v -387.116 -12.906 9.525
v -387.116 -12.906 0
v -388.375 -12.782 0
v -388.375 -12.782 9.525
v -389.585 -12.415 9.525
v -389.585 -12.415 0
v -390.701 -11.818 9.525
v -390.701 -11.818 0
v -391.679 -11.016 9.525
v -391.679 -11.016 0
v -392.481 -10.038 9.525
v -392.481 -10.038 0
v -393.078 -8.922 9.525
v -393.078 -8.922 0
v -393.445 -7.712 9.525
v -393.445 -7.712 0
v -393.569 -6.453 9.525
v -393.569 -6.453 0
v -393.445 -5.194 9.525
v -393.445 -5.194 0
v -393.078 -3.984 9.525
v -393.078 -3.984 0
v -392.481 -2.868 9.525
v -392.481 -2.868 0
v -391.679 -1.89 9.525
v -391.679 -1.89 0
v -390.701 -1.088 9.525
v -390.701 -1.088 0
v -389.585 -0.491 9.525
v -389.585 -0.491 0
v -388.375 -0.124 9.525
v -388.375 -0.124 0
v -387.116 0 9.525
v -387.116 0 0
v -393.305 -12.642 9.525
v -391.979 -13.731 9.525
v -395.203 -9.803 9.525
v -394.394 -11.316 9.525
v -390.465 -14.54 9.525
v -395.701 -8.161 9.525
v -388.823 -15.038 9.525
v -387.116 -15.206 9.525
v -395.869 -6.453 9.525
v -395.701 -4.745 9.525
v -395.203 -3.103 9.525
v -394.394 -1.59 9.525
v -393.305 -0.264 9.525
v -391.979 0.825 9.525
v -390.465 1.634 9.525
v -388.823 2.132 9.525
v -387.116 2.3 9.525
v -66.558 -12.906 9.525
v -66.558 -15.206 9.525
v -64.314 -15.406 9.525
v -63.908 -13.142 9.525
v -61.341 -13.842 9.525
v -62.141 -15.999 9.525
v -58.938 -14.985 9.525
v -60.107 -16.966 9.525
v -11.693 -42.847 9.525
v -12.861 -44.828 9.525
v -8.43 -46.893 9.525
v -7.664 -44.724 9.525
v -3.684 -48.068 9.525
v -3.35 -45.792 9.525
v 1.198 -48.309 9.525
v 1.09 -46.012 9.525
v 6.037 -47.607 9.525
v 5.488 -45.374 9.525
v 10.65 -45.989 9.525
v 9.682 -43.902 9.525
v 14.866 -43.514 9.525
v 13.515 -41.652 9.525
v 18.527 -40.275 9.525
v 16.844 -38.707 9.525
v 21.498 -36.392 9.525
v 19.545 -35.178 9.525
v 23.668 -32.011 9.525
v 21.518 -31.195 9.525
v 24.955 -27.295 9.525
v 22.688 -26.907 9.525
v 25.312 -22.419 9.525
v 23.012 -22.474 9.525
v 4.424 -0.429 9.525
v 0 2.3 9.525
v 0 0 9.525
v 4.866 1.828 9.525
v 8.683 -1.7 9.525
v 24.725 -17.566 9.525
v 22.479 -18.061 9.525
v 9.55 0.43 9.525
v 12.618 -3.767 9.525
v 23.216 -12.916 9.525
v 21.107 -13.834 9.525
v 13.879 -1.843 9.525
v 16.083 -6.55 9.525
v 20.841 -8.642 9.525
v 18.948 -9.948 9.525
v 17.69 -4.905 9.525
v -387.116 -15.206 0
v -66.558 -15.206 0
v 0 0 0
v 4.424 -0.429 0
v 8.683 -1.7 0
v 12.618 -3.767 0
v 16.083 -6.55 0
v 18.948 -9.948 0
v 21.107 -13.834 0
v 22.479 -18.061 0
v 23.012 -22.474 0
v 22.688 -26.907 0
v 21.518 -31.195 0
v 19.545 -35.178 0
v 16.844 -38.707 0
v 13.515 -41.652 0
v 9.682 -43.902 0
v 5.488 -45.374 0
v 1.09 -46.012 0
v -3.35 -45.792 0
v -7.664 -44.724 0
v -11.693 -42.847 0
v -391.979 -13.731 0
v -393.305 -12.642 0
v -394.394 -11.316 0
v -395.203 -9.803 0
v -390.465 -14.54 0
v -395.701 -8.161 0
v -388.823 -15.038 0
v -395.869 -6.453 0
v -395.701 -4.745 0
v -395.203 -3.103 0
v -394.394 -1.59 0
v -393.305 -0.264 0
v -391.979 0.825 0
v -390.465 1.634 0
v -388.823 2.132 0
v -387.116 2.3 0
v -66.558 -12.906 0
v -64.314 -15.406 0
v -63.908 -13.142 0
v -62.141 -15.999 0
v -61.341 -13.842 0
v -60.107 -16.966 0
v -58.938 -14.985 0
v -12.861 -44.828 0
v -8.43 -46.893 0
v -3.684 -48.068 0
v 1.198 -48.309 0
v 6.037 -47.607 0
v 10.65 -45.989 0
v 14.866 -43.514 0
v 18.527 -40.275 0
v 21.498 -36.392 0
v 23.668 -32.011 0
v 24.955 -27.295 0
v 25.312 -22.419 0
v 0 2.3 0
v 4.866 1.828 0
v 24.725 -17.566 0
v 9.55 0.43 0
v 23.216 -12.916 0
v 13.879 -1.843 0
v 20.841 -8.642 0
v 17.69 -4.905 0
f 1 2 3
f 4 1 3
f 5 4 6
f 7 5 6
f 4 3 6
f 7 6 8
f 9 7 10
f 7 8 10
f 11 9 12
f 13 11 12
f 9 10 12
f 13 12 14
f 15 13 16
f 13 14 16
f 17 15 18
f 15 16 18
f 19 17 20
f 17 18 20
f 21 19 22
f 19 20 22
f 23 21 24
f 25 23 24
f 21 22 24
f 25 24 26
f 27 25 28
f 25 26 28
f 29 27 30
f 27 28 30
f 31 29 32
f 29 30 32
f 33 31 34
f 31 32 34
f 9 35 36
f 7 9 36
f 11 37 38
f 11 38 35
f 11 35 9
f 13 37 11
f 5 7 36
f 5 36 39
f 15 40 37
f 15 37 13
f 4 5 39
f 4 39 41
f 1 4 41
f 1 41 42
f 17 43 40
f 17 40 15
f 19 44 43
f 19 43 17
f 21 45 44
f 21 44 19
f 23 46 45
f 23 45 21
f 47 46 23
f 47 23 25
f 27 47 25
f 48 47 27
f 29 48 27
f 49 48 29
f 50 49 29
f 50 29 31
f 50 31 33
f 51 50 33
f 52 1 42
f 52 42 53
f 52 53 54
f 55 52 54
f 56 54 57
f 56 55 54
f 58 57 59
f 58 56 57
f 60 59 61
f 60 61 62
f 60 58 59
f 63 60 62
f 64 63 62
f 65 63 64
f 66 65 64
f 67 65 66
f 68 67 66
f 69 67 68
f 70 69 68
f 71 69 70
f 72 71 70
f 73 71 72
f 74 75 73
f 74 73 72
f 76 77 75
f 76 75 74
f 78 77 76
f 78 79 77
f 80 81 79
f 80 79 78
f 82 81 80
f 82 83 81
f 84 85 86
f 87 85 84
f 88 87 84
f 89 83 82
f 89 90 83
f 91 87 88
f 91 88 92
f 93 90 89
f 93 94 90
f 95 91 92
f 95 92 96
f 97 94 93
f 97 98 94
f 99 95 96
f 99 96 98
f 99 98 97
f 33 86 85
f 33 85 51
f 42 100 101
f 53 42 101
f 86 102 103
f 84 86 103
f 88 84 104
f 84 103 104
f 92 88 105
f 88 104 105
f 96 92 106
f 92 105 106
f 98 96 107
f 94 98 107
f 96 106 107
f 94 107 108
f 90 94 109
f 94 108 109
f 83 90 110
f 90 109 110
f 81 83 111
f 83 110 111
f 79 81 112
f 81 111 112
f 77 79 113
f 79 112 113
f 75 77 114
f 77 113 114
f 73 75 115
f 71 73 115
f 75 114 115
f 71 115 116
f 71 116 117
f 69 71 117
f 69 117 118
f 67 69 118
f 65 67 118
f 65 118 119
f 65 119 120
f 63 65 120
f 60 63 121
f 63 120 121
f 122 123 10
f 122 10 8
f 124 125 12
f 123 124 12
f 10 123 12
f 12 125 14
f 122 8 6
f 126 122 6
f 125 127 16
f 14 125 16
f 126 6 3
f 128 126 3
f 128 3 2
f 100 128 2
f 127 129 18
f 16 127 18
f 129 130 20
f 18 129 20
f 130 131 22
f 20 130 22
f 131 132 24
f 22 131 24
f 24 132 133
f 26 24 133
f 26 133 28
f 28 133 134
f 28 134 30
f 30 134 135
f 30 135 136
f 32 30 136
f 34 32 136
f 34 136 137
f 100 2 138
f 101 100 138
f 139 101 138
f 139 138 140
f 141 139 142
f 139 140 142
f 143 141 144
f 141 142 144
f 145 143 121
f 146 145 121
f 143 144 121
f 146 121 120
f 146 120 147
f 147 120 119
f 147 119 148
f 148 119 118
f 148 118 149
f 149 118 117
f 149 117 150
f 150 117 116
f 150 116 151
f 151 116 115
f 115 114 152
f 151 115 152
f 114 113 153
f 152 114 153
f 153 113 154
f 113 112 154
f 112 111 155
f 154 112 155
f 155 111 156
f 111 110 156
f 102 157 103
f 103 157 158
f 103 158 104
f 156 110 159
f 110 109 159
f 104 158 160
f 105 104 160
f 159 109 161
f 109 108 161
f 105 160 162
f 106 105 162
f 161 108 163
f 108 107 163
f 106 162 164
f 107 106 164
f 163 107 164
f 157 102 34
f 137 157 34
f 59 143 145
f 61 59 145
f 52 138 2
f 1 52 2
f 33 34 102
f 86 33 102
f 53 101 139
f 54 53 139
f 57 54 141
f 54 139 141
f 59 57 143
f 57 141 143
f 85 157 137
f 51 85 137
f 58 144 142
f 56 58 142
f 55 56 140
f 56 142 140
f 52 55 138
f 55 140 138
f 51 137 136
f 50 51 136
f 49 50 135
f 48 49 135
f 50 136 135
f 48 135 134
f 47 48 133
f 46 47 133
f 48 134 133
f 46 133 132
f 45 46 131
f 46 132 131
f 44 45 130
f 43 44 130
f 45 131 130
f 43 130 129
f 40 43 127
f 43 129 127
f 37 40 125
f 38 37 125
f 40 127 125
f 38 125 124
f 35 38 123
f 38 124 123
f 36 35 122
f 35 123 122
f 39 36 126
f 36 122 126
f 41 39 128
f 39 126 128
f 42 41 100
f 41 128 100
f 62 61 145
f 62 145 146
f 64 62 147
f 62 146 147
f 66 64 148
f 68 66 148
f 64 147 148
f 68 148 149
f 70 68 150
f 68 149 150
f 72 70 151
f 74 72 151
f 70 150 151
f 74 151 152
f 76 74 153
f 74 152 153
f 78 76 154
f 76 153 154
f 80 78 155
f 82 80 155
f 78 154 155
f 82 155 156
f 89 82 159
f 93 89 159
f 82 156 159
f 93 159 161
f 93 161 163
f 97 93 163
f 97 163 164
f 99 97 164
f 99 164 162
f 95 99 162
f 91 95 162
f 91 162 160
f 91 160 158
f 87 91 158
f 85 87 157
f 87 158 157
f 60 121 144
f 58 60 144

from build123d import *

# Parameters (mm, degrees)
F1_DEPTH = 9.525


with BuildPart() as f1:
    # F0 (on Top) → F1 (new body)
    with BuildSketch(Plane.XY):
        with BuildLine():
            Line((0, 2.3), (-387.115837, 2.3))
            ThreePointArc((-387.115837, 2.3), (-395.868834, -6.452997), (-387.115837, -15.205994))
            Line((-387.115837, -15.205994), (-66.557919, -15.205994))
            ThreePointArc((-66.557919, -15.205994), (-63.2144, -15.654019), (-60.106784, -16.966485))
            Line((-60.106784, -16.966485), (-12.860997, -44.827782))
            ThreePointArc((-12.860997, -44.827782), (24.425566, -29.684396), (0, 2.3))
        make_face()
        with BuildLine():
            ThreePointArc((0, 0), (22.206704, -29.078877), (-11.692681, -42.846611))
            Line((-11.692681, -42.846611), (-58.938469, -14.985314))
            ThreePointArc((-58.938469, -14.985314), (-62.608881, -13.435158), (-66.557919, -12.905994))
            Line((-66.557919, -12.905994), (-387.115837, -12.905994))
            ThreePointArc((-387.115837, -12.905994), (-393.568834, -6.452997), (-387.115837, 0))
            Line((-387.115837, 0), (0, 0))
        make_face(mode=Mode.SUBTRACT)
    extrude(amount=F1_DEPTH)


solid = f1.part
